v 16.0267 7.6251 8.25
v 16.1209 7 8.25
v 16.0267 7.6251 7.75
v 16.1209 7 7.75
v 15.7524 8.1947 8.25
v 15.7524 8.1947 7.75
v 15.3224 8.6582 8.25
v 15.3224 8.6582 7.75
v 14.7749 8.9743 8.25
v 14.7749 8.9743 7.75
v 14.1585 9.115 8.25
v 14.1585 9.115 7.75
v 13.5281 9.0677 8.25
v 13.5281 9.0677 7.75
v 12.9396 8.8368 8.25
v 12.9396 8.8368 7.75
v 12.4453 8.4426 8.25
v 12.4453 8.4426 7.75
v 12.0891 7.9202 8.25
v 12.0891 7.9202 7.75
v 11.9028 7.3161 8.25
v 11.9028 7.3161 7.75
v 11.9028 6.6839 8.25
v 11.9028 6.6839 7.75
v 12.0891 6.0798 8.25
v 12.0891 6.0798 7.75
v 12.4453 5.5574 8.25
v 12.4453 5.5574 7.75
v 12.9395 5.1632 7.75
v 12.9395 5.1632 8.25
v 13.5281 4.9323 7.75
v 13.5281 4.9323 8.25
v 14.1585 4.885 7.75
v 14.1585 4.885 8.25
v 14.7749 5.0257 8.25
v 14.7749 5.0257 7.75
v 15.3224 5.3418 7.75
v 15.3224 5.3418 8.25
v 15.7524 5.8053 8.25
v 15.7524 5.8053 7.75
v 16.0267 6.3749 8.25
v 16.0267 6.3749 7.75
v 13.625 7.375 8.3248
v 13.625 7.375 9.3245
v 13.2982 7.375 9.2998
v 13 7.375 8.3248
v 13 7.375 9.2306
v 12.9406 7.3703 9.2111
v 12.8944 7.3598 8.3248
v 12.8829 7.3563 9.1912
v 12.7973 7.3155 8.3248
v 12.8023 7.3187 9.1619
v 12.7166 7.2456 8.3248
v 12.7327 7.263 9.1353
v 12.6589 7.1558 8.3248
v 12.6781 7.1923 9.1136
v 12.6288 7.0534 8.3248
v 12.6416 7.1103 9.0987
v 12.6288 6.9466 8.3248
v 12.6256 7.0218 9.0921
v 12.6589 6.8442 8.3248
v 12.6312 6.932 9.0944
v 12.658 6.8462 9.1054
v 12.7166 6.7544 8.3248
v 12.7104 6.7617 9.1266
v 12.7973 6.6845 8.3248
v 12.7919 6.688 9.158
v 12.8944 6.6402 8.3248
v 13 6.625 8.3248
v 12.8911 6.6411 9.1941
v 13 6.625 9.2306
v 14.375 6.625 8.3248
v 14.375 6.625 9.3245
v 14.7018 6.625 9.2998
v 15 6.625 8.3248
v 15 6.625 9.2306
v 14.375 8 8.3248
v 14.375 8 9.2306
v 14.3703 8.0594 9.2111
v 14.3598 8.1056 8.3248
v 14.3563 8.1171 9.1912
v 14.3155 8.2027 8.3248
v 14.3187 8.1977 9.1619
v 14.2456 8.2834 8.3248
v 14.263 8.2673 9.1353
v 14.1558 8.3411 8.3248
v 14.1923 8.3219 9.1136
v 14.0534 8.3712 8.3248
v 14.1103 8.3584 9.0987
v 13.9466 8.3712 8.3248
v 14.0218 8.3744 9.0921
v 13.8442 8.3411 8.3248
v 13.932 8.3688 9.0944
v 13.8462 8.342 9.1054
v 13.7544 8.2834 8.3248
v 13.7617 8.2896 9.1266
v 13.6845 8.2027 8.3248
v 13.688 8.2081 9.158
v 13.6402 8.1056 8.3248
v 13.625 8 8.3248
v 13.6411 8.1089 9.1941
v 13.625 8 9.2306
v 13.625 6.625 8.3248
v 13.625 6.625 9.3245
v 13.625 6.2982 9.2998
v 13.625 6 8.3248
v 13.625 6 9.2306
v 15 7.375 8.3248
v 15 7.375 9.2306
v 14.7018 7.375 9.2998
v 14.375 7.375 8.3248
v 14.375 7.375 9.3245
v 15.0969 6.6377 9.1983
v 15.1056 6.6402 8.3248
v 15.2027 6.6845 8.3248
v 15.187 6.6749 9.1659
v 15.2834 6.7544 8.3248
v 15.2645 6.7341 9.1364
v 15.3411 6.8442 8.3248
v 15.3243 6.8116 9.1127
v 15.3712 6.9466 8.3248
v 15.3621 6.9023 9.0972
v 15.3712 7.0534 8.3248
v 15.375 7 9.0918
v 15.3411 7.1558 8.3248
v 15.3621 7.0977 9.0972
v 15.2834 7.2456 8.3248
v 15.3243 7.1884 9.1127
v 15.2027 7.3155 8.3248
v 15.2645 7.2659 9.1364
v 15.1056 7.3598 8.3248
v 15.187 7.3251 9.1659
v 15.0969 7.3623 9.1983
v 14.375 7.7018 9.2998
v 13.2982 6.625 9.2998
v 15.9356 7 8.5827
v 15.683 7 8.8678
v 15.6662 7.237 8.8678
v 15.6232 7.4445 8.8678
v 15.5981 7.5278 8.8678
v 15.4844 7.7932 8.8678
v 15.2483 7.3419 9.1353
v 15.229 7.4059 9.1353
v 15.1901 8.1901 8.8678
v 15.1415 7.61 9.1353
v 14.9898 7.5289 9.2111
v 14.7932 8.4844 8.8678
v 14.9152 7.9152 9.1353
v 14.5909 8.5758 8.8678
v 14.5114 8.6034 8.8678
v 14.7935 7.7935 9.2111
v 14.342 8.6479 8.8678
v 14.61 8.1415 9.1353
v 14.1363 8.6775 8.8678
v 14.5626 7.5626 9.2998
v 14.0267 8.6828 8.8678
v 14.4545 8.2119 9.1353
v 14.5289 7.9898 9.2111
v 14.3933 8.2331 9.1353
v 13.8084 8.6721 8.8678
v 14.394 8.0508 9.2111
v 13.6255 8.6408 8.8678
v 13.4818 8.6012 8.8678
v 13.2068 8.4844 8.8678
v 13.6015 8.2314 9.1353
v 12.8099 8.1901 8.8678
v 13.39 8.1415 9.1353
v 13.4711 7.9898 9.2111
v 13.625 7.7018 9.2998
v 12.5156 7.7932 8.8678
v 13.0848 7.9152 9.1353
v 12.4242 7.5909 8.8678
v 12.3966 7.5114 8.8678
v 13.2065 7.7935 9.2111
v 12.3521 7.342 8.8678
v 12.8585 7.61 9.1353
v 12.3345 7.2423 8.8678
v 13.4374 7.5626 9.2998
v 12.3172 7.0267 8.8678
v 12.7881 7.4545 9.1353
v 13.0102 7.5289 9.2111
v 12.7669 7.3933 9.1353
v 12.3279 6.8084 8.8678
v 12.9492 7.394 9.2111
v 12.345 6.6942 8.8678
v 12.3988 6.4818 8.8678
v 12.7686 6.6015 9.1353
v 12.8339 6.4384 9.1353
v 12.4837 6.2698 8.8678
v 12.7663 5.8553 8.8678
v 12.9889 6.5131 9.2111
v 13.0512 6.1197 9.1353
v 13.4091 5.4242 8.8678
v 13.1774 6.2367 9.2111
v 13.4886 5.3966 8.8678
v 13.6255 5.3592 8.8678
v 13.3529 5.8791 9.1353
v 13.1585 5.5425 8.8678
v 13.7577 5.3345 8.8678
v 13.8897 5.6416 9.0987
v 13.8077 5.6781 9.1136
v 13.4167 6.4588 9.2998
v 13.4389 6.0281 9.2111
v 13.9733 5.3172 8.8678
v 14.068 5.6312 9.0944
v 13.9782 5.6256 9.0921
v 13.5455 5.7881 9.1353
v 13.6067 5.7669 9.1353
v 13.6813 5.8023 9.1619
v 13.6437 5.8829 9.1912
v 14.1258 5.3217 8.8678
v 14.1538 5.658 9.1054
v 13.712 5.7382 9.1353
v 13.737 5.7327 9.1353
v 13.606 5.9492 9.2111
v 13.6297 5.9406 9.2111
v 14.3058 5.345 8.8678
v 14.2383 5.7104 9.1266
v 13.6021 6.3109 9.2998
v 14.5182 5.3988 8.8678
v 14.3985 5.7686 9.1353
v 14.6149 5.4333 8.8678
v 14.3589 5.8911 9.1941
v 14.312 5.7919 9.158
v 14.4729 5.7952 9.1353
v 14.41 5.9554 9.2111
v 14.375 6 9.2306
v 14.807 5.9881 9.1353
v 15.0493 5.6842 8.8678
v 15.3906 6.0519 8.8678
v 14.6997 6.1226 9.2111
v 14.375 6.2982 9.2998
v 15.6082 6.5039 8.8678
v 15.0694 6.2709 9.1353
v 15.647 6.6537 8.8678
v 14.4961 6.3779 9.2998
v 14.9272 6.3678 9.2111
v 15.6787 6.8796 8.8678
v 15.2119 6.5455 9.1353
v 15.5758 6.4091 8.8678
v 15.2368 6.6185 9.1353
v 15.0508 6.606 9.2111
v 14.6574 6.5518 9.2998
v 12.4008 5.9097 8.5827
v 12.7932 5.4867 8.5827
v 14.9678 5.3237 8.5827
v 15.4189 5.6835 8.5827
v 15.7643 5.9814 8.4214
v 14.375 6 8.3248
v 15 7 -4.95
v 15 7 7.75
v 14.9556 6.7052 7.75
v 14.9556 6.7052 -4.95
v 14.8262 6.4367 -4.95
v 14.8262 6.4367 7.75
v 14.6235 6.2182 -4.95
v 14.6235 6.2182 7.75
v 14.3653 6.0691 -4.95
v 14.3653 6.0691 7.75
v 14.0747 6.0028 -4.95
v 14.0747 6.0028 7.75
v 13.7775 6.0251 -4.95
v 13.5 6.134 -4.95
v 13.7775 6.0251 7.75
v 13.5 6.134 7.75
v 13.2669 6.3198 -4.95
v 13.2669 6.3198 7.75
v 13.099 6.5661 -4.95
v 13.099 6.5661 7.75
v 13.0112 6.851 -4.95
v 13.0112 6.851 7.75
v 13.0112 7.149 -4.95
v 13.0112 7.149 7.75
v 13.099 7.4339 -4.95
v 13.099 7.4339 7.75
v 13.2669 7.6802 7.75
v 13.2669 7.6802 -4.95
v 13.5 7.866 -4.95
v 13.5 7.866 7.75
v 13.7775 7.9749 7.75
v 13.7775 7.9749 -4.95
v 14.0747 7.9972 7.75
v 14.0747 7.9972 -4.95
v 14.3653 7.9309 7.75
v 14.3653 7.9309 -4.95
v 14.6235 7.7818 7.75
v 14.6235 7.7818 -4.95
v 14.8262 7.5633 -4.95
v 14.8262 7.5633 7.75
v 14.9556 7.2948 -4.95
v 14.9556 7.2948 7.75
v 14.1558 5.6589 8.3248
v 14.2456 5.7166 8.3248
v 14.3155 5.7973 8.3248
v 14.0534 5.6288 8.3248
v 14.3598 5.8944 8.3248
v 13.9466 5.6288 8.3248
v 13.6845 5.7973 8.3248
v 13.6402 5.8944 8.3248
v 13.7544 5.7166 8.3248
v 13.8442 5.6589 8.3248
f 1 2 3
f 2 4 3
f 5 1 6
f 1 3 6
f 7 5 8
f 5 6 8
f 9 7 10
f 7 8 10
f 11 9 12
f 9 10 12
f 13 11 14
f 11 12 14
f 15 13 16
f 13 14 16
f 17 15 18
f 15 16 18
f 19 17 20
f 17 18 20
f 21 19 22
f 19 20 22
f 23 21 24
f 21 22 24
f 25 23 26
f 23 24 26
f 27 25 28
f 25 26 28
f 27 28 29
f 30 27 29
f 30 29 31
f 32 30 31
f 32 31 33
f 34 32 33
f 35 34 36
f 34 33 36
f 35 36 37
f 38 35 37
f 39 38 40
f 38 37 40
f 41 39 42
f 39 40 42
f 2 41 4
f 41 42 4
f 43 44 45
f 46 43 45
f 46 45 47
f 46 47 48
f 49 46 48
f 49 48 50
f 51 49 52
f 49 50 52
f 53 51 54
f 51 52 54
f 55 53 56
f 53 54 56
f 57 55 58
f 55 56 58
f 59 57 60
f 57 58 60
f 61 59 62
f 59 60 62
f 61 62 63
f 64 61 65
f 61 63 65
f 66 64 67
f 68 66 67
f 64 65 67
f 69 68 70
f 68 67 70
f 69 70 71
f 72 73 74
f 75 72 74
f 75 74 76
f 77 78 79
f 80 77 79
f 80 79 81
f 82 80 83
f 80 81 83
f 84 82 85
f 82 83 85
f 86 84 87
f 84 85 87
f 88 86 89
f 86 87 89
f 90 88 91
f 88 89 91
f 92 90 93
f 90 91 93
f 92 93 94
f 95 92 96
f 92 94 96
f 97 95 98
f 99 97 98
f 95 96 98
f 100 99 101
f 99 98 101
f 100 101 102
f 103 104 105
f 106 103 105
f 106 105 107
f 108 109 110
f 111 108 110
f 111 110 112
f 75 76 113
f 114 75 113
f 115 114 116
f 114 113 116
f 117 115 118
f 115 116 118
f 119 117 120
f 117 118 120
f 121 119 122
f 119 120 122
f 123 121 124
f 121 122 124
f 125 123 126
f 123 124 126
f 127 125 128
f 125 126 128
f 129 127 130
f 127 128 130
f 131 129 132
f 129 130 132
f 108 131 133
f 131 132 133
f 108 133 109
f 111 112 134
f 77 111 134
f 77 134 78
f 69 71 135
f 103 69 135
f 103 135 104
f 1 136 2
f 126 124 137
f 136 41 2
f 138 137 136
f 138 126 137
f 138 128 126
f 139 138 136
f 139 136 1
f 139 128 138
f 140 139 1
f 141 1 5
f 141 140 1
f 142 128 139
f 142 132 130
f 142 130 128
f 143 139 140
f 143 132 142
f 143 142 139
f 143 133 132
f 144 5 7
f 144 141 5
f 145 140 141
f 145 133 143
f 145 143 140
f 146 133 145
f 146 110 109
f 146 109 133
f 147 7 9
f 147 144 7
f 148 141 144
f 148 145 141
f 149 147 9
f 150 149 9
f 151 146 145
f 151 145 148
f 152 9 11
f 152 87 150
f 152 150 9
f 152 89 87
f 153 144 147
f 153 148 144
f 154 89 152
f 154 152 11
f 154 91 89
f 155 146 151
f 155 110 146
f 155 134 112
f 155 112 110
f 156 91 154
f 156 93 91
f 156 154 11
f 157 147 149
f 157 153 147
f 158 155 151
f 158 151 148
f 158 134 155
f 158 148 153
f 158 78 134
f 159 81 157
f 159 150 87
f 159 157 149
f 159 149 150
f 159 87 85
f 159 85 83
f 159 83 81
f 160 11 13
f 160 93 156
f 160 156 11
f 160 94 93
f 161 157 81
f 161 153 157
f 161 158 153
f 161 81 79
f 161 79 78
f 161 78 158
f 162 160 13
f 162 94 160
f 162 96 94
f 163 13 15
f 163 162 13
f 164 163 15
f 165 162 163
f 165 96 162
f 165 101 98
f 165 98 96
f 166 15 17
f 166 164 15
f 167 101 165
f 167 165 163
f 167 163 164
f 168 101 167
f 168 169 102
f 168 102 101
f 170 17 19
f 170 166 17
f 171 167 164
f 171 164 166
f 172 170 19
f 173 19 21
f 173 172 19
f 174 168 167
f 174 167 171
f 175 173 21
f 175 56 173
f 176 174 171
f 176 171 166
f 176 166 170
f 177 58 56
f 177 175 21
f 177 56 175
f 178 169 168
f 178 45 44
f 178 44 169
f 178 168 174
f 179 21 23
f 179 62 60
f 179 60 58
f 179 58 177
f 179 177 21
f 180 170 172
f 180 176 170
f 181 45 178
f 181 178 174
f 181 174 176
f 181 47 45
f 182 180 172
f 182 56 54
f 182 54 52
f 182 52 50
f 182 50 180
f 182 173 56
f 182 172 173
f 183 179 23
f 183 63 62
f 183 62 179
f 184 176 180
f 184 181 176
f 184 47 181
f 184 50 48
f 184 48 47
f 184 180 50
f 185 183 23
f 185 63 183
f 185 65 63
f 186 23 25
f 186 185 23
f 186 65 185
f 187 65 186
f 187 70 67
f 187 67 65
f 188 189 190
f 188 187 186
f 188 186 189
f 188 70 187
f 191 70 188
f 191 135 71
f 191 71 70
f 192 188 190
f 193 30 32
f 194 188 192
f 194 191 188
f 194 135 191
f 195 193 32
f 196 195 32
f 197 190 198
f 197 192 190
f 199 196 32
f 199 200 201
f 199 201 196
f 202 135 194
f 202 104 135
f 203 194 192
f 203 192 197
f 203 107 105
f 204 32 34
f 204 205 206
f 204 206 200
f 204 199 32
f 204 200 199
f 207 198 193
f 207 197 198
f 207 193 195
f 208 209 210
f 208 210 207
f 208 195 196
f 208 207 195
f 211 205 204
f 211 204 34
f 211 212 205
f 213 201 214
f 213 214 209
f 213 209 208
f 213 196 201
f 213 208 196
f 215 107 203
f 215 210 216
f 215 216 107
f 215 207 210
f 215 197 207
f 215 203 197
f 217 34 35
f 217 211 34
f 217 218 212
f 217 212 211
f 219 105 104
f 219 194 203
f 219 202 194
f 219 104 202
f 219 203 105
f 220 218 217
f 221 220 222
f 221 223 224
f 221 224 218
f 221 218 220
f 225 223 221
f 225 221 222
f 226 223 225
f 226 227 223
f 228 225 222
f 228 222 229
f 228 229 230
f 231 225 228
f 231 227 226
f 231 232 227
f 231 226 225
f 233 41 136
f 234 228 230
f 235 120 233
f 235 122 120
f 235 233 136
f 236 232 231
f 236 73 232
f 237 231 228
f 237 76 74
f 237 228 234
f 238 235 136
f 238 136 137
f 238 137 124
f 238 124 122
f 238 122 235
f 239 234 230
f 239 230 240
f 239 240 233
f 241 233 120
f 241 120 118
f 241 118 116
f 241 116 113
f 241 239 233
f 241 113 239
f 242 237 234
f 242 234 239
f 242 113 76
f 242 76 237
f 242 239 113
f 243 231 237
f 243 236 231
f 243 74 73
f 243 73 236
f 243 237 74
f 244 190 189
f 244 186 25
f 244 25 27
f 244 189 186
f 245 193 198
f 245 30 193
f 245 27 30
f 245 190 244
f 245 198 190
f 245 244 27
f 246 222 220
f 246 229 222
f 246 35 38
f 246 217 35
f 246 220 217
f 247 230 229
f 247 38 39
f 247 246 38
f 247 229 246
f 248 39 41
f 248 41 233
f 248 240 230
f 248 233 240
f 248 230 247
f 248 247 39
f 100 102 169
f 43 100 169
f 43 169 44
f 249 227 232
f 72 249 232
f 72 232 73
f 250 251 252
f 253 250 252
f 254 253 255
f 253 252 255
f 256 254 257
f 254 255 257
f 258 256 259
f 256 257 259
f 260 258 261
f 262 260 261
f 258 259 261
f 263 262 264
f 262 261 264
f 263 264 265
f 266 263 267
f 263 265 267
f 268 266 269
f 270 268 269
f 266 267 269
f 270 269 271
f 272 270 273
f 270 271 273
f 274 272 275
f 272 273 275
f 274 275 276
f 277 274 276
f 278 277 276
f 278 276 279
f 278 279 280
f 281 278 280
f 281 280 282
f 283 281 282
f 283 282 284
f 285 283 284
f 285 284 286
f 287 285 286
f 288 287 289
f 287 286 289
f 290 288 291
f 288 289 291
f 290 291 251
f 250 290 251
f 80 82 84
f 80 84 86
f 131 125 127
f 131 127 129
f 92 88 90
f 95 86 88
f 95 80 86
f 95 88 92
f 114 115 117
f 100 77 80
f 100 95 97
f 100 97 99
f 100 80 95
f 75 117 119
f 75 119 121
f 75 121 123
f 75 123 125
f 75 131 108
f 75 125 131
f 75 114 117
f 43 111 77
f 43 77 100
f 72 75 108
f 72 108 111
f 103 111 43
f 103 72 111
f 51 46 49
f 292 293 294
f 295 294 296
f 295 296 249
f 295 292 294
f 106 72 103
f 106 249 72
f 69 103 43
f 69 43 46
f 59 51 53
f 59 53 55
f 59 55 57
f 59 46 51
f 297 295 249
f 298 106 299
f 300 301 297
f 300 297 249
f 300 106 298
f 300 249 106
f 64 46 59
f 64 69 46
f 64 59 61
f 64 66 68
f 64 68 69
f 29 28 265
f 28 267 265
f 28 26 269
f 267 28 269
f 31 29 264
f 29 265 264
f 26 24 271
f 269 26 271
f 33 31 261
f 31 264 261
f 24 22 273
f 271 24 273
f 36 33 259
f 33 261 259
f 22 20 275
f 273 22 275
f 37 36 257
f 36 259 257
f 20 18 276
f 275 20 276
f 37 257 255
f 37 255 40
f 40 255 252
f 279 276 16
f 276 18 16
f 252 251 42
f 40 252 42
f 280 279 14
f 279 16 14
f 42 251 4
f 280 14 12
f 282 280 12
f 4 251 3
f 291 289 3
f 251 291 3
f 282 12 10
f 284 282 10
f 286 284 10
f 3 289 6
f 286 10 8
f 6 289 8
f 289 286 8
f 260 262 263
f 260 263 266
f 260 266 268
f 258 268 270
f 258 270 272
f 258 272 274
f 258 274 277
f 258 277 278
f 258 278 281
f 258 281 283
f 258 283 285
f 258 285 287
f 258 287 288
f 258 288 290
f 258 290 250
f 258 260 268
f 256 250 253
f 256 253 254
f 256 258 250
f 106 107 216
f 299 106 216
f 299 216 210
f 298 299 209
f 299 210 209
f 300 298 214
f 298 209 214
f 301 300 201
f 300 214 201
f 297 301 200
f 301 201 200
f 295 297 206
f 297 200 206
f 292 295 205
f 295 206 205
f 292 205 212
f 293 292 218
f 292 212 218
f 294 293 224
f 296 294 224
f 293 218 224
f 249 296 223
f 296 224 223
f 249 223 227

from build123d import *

# Parameters (mm, degrees)
POCKET004_DEPTH = 1
SKETCH013_R     = 1
PAD005_DEPTH    = 12.7


with BuildPart() as part:
    # Sketch011 → Revolution001 (revolve)
    with BuildSketch(Plane.XZ):
        with BuildLine():
            Line((0, 0), (0, 1.5748))
            Line((0, 1.5748), (0.5, 1.5748))
            ThreePointArc((2.1209, 0.5), (1.472434, 1.281687), (0.5, 1.5748))
            Line((2.1209, 0.5), (2.1209, 0))
            Line((2.1209, 0), (0, 0))
        make_face()
    revolve(axis=Axis((0, 0, 0), (0, 0, 1)))

    # Sketch012 (on Face1 of Revolution001) → Pocket004 (cut)
    with BuildSketch(Plane(origin=(0, 0, 1.5748), x_dir=(-1, 0, 0), z_dir=(0, 0, 1))):
        with BuildLine():
            ThreePointArc((0.375, 1), (0, 1.375), (-0.375, 1))
            Line((-0.375, 1), (-0.375, 0.375))
            Line((-0.375, 0.375), (-1, 0.375))
            ThreePointArc((-1, 0.375), (-1.375, 0), (-1, -0.375))
            Line((-1, -0.375), (-0.375, -0.375))
            Line((-0.375, -0.375), (-0.375, -1))
            ThreePointArc((-0.375, -1), (0, -1.375), (0.375, -1))
            Line((0.375, -1), (0.375, -0.375))
            Line((0.375, -0.375), (1, -0.375))
            ThreePointArc((1, -0.375), (1.375, 0), (1, 0.375))
            Line((1, 0.375), (0.375, 0.375))
            Line((0.375, 0.375), (0.375, 1))
        make_face()
    extrude(amount=-POCKET004_DEPTH, mode=Mode.SUBTRACT)

    # Sketch013 (on Face16 of Pocket004) → Pad005 (join)
    with BuildSketch(Plane(origin=(0, 0, 0), x_dir=(1, 0, 0), z_dir=(0, 0, -1))):
        Circle(SKETCH013_R)
    extrude(amount=PAD005_DEPTH)


with BuildPart() as part_1:
    # Body003 placement: moved
    add(part.part.moved(Location((14, 7, 7.75))))


solid = part_1.part
